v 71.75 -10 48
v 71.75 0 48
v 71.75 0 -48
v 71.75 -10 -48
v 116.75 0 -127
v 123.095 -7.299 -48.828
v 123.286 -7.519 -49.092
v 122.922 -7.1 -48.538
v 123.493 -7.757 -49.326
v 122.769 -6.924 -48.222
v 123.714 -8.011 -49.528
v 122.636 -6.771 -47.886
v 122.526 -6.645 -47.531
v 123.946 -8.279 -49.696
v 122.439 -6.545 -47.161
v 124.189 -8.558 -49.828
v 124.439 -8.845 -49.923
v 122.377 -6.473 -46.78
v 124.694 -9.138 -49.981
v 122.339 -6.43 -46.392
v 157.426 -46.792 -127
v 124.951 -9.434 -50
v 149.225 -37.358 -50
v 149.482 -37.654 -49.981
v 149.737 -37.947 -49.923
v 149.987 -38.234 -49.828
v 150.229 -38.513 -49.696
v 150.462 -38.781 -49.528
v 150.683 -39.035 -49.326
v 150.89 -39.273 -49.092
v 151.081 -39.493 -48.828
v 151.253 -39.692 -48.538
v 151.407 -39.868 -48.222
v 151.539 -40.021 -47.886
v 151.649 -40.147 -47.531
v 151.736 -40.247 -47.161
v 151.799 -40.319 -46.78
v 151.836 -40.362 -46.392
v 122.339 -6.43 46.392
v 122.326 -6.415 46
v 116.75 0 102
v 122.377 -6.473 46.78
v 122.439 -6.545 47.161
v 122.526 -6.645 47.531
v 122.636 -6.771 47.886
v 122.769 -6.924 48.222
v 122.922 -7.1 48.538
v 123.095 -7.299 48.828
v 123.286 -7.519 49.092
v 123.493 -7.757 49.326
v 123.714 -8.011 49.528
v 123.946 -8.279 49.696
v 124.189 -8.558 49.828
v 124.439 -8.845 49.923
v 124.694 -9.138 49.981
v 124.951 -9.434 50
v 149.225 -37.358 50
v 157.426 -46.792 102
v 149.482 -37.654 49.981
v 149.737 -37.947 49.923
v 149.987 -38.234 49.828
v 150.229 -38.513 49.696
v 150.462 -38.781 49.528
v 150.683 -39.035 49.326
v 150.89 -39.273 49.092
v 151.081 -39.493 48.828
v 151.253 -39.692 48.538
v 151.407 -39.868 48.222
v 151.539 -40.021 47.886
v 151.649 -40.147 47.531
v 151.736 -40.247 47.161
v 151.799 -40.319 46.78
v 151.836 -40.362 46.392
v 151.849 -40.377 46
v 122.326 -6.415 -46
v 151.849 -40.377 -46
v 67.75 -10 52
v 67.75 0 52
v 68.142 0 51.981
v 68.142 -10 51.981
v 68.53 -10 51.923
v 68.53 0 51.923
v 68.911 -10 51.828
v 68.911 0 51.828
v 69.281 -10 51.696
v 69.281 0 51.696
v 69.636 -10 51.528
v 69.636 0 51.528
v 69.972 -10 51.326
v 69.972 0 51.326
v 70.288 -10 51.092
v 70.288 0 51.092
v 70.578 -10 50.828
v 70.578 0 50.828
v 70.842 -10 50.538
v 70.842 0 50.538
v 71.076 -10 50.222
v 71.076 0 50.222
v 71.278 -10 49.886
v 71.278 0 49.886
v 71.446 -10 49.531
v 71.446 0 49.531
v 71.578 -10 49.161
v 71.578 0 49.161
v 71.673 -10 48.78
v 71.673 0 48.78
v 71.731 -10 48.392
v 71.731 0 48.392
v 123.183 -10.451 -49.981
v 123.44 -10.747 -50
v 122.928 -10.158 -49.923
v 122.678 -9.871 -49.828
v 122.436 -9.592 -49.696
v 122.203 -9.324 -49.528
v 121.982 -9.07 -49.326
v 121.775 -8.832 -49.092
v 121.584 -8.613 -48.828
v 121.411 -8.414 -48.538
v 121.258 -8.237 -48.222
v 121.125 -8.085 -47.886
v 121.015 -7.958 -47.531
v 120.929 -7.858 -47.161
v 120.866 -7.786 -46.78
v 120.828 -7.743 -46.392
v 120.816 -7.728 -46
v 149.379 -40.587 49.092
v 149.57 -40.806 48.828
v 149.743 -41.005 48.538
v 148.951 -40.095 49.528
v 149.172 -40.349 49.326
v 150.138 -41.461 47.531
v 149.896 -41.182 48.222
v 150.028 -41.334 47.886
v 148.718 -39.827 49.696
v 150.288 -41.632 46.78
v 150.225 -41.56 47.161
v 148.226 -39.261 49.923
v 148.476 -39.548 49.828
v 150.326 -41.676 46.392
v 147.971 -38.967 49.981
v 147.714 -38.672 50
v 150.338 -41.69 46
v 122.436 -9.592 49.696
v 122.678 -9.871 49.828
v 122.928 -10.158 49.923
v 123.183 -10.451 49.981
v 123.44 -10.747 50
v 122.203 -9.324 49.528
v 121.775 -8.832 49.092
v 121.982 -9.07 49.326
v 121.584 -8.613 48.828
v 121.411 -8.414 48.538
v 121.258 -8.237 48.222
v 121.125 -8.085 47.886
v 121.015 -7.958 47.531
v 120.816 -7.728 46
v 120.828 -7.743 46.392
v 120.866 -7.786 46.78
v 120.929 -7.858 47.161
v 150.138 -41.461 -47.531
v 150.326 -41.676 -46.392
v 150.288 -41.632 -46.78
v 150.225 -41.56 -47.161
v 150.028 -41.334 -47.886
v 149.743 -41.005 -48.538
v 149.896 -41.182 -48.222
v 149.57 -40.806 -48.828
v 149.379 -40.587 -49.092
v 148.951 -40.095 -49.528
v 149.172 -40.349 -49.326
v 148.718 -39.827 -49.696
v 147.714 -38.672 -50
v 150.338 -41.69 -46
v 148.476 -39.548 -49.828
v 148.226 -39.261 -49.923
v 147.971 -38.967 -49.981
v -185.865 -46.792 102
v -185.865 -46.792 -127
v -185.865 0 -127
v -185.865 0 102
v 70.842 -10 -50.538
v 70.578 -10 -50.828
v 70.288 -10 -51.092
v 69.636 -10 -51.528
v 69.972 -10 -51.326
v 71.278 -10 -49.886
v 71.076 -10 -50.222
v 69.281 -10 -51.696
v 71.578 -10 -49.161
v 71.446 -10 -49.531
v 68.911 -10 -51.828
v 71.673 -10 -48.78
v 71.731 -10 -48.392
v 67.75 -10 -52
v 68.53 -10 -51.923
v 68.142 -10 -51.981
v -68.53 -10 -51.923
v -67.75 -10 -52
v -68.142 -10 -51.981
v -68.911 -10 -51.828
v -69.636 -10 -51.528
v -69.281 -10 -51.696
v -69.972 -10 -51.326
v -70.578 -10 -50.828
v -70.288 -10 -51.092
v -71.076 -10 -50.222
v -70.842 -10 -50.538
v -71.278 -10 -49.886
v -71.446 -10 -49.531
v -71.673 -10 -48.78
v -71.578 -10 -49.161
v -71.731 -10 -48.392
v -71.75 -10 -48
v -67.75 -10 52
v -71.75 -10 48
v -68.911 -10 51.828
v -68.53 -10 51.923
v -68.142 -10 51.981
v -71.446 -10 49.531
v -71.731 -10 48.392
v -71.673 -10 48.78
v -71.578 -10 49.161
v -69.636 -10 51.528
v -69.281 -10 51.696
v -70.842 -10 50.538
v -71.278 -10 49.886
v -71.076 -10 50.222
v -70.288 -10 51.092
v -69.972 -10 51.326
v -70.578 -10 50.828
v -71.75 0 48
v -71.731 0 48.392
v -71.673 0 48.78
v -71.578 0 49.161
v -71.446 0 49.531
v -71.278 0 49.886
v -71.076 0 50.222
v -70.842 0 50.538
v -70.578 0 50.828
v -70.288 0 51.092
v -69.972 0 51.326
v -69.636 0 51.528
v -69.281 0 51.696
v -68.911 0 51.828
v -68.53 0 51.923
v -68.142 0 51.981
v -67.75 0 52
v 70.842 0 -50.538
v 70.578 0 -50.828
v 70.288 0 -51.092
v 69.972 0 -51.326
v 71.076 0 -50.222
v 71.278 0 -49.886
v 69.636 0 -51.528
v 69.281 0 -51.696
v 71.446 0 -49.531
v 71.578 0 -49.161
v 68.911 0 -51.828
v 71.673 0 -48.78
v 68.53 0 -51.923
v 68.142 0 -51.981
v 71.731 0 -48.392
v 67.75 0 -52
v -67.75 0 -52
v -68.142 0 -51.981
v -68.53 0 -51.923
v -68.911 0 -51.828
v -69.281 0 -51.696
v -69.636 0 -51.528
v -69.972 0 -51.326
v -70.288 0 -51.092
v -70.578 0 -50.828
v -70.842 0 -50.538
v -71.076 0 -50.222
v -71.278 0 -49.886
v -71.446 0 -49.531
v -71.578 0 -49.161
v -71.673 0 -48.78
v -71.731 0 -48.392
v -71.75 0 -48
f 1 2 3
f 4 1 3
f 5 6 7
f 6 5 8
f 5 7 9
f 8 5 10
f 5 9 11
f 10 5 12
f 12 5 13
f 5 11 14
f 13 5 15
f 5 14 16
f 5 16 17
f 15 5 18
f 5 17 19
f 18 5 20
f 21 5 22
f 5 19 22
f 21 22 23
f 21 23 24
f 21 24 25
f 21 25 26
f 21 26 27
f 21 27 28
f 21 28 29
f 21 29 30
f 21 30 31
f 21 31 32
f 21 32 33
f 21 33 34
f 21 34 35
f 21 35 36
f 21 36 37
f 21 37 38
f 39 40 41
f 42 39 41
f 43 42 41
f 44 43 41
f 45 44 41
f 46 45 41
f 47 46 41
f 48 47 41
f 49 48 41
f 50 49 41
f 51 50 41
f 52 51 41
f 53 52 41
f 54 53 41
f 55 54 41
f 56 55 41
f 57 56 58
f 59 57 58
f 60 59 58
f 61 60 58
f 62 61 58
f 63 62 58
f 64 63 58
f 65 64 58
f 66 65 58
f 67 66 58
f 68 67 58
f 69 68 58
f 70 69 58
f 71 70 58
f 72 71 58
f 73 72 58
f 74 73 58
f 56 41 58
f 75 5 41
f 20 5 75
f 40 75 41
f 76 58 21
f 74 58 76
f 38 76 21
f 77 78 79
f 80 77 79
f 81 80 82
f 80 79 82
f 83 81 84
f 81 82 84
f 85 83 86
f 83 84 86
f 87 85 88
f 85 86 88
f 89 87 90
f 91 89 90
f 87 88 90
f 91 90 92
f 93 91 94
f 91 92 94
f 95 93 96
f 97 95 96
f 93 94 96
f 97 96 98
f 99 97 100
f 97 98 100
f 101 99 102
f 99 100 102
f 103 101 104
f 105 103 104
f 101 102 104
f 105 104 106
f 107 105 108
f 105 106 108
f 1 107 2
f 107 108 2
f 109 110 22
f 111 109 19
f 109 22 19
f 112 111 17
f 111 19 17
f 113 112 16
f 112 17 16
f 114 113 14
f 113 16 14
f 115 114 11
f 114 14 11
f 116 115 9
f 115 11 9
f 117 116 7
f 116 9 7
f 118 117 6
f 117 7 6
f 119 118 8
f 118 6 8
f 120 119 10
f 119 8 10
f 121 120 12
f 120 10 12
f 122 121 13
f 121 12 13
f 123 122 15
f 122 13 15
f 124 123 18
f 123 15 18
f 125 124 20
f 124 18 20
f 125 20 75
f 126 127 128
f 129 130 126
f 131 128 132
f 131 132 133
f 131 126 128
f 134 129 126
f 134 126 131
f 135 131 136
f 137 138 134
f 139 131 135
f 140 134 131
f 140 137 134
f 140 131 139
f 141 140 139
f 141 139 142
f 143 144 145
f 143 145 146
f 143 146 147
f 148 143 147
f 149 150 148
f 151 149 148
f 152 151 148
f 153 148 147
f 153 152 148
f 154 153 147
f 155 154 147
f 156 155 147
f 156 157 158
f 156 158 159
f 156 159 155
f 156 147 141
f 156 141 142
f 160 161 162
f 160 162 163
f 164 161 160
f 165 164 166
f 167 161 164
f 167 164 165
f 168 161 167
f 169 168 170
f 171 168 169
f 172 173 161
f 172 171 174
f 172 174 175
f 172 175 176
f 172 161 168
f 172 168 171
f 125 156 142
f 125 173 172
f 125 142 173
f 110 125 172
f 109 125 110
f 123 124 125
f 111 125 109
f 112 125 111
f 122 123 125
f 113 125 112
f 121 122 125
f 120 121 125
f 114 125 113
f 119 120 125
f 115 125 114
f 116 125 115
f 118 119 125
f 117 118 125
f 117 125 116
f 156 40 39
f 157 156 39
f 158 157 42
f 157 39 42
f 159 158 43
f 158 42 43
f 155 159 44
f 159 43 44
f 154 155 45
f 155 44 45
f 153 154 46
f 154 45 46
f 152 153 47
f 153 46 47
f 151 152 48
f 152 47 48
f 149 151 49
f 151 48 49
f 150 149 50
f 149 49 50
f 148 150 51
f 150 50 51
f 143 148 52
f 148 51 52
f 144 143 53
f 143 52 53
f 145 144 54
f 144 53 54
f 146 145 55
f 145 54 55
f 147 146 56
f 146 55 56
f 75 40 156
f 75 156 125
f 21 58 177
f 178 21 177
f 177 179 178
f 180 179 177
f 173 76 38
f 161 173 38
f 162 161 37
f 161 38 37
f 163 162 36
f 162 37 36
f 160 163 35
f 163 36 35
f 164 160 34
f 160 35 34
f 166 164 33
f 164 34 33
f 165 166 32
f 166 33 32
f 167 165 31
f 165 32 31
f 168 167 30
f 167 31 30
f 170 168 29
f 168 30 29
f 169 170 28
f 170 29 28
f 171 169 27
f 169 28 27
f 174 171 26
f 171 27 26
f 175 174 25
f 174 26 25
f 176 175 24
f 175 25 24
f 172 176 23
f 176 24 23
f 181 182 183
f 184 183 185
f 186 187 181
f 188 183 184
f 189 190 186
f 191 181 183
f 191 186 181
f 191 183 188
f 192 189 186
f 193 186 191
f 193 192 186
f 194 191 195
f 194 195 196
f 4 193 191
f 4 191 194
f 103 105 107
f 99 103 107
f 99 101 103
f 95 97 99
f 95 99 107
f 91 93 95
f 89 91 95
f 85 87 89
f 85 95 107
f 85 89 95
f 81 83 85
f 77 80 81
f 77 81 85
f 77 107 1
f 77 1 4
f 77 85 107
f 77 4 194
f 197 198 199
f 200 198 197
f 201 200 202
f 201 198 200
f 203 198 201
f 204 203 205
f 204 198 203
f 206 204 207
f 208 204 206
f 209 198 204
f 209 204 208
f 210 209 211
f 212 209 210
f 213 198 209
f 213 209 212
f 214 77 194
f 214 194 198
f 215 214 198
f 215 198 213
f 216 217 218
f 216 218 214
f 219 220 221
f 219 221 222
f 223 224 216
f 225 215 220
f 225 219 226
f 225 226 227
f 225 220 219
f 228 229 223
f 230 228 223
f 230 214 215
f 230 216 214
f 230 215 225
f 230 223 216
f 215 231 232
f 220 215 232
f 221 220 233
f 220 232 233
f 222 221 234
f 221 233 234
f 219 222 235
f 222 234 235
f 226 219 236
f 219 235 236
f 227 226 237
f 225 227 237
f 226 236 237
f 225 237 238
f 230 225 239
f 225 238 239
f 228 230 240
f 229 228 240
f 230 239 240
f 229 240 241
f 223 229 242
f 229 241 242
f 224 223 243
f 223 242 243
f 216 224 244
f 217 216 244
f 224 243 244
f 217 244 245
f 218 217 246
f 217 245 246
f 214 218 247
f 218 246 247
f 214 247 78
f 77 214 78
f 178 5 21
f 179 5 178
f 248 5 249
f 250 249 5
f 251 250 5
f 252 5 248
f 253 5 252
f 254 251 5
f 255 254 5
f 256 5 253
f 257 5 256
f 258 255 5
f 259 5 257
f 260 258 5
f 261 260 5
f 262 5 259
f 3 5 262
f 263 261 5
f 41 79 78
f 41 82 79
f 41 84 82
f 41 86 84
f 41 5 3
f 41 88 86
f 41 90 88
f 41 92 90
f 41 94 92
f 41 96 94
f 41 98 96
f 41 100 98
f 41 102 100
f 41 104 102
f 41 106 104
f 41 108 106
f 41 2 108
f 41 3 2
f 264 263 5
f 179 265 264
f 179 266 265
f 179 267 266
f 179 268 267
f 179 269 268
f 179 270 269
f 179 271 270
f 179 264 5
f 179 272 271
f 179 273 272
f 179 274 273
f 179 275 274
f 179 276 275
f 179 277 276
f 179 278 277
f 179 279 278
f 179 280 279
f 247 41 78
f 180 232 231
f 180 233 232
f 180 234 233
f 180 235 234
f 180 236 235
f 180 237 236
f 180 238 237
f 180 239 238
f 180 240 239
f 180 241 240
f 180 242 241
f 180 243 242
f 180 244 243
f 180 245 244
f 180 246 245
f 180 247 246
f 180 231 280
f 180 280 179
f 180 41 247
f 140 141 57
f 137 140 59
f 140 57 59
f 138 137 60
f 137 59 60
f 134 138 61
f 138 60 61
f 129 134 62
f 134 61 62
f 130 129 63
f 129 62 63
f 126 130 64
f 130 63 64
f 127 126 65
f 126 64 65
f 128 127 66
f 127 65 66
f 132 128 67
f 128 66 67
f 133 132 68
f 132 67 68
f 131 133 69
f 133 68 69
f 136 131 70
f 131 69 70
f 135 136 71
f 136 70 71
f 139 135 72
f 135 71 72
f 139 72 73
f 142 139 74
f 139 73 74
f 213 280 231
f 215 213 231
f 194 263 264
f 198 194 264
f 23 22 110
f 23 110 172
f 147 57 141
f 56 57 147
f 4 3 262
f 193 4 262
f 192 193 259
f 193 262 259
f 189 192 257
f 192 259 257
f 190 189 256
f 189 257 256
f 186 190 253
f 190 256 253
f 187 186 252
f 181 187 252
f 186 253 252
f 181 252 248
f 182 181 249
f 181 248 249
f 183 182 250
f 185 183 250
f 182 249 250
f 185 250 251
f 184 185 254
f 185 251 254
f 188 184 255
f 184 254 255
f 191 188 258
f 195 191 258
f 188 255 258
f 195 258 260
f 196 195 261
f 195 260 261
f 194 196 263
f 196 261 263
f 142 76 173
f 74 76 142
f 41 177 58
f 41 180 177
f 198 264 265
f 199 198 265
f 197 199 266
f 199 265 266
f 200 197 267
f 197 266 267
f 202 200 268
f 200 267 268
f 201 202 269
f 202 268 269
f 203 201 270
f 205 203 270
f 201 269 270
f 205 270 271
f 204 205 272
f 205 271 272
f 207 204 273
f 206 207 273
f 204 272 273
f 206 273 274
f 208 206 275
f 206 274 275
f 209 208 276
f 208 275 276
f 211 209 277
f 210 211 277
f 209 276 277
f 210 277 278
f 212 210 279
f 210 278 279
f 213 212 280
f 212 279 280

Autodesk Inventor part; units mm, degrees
ref_plane "YZ Plane" through (0, 0, 0) normal (1, 0, 0) x (0, 1, 0)
ref_plane "XZ Plane" through (0, 0, 0) normal (0, 1, 0) x (-1, 0, 0)
ref_plane "XY Plane" through (0, 0, 0) normal (0, 0, 1) x (1, 0, 0)
sketch "Эскиз1" plane through (0, 0, 0) normal (0, 1, 0) x (-1, 0, 0)
  line L0 (-67.75, -52) -> (67.75, -52)
  line L1 (71.75, -48) -> (71.75, 48)
  line L2 (67.75, 52) -> (-67.75, 52)
  line L3 (-71.75, 48) -> (-71.75, -48)
  line L4 (-71.75, -52) -> (71.75, 52) construction
  line L5 (71.75, -52) -> (-71.75, 52) construction
  arc A0 (71.75, 48) -> (67.75, 52) centre (67.75, 48) ccw
  arc A1 (67.75, -52) -> (71.75, -48) centre (67.75, -48) ccw
  arc A2 (-71.75, -48) -> (-67.75, -52) centre (-67.75, -48) ccw
  arc A3 (-67.75, 52) -> (-71.75, 48) centre (-67.75, 48) ccw
  line L6 (185.8649, 102) -> (-116.75, 102)
  line L7 (-116.75, 102) -> (-116.75, -127)
  line L8 (-116.75, -127) -> (185.8649, -127)
  line L9 (185.8649, -127) -> (185.8649, 102)
  point P0 (0, 0)
  point P1 (34.5574, -127)
  dimension "d0" = 143.5
  dimension "d1" = 104
  dimension "d2" = 4
  dimension "d3" = 45
  dimension "d4" = 50
  dimension "d5" = 75
extrude "Выдавливание1" add sketch "Эскиз1" against normal blind 10
sketch "Эскиз2" plane through (-185.8649, 0, 102) normal (0, 0, 1) x (1, 0, 0)
  line L0 (0, 0) -> (302.6149, 0) projected
  line L1 (302.6149, 0) -> (343.2905, -46.792)
  line L2 (343.2905, -46.792) -> (0, -46.792)
  line L3 (0, 0) -> (0, -10) projected
  line L4 (0, -46.792) -> (0, 0)
  line L5 (0, 0) -> (302.6149, 0) projected
  line L6 (0, 0) -> (0, -10) projected
  line L7 (302.6149, -10) -> (0, -10) projected
  line L8 (302.6149, 0) -> (302.6149, -10) projected
  point P0 (185.8649, 0)
  point P1 (302.6149, 0)
  point P2 (0, -10)
  dimension "d8" = 131
  dimension "d9" = 62
extrude "Выдавливание2" add sketch "Эскиз2" against normal up to surface (229 mm away) contours L1 L2 L4 L7 L8
sketch "Эскиз3" plane through (116.75, 0, 102) normal (0.7547, 0.6561, 0) x (0, 0, -1)
  line L0 (56, -8.5) -> (148, -8.5)
  line L1 (152, -12.5) -> (152, -49.5)
  line L2 (148, -53.5) -> (56, -53.5)
  line L3 (52, -49.5) -> (52, -12.5)
  line L4 (0, 0) -> (229, 0) projected
  line L5 (154, 121.0429) -> (154, 32.1469) projected
  arc A0 (56, -8.5) -> (52, -12.5) centre (56, -12.5) ccw
  arc A1 (152, -12.5) -> (148, -8.5) centre (148, -12.5) ccw
  arc A2 (148, -53.5) -> (152, -49.5) centre (148, -49.5) ccw
  arc A3 (52, -49.5) -> (56, -53.5) centre (56, -49.5) ccw
  line L6 (102, -8.5) -> (102, -53.5)
  line L7 (150, 29.5227) -> (54, 29.5227) projected
  point P0 (102, 76.5949)
  point P1 (102, 29.5227)
  dimension "d12" = 100
  dimension "d13" = 45
  dimension "d14" = 8.5
  dimension "d16" = 4
extrude "Выдавливание3" cut sketch "Эскиз3" against normal blind 2
properties part number "3d"
